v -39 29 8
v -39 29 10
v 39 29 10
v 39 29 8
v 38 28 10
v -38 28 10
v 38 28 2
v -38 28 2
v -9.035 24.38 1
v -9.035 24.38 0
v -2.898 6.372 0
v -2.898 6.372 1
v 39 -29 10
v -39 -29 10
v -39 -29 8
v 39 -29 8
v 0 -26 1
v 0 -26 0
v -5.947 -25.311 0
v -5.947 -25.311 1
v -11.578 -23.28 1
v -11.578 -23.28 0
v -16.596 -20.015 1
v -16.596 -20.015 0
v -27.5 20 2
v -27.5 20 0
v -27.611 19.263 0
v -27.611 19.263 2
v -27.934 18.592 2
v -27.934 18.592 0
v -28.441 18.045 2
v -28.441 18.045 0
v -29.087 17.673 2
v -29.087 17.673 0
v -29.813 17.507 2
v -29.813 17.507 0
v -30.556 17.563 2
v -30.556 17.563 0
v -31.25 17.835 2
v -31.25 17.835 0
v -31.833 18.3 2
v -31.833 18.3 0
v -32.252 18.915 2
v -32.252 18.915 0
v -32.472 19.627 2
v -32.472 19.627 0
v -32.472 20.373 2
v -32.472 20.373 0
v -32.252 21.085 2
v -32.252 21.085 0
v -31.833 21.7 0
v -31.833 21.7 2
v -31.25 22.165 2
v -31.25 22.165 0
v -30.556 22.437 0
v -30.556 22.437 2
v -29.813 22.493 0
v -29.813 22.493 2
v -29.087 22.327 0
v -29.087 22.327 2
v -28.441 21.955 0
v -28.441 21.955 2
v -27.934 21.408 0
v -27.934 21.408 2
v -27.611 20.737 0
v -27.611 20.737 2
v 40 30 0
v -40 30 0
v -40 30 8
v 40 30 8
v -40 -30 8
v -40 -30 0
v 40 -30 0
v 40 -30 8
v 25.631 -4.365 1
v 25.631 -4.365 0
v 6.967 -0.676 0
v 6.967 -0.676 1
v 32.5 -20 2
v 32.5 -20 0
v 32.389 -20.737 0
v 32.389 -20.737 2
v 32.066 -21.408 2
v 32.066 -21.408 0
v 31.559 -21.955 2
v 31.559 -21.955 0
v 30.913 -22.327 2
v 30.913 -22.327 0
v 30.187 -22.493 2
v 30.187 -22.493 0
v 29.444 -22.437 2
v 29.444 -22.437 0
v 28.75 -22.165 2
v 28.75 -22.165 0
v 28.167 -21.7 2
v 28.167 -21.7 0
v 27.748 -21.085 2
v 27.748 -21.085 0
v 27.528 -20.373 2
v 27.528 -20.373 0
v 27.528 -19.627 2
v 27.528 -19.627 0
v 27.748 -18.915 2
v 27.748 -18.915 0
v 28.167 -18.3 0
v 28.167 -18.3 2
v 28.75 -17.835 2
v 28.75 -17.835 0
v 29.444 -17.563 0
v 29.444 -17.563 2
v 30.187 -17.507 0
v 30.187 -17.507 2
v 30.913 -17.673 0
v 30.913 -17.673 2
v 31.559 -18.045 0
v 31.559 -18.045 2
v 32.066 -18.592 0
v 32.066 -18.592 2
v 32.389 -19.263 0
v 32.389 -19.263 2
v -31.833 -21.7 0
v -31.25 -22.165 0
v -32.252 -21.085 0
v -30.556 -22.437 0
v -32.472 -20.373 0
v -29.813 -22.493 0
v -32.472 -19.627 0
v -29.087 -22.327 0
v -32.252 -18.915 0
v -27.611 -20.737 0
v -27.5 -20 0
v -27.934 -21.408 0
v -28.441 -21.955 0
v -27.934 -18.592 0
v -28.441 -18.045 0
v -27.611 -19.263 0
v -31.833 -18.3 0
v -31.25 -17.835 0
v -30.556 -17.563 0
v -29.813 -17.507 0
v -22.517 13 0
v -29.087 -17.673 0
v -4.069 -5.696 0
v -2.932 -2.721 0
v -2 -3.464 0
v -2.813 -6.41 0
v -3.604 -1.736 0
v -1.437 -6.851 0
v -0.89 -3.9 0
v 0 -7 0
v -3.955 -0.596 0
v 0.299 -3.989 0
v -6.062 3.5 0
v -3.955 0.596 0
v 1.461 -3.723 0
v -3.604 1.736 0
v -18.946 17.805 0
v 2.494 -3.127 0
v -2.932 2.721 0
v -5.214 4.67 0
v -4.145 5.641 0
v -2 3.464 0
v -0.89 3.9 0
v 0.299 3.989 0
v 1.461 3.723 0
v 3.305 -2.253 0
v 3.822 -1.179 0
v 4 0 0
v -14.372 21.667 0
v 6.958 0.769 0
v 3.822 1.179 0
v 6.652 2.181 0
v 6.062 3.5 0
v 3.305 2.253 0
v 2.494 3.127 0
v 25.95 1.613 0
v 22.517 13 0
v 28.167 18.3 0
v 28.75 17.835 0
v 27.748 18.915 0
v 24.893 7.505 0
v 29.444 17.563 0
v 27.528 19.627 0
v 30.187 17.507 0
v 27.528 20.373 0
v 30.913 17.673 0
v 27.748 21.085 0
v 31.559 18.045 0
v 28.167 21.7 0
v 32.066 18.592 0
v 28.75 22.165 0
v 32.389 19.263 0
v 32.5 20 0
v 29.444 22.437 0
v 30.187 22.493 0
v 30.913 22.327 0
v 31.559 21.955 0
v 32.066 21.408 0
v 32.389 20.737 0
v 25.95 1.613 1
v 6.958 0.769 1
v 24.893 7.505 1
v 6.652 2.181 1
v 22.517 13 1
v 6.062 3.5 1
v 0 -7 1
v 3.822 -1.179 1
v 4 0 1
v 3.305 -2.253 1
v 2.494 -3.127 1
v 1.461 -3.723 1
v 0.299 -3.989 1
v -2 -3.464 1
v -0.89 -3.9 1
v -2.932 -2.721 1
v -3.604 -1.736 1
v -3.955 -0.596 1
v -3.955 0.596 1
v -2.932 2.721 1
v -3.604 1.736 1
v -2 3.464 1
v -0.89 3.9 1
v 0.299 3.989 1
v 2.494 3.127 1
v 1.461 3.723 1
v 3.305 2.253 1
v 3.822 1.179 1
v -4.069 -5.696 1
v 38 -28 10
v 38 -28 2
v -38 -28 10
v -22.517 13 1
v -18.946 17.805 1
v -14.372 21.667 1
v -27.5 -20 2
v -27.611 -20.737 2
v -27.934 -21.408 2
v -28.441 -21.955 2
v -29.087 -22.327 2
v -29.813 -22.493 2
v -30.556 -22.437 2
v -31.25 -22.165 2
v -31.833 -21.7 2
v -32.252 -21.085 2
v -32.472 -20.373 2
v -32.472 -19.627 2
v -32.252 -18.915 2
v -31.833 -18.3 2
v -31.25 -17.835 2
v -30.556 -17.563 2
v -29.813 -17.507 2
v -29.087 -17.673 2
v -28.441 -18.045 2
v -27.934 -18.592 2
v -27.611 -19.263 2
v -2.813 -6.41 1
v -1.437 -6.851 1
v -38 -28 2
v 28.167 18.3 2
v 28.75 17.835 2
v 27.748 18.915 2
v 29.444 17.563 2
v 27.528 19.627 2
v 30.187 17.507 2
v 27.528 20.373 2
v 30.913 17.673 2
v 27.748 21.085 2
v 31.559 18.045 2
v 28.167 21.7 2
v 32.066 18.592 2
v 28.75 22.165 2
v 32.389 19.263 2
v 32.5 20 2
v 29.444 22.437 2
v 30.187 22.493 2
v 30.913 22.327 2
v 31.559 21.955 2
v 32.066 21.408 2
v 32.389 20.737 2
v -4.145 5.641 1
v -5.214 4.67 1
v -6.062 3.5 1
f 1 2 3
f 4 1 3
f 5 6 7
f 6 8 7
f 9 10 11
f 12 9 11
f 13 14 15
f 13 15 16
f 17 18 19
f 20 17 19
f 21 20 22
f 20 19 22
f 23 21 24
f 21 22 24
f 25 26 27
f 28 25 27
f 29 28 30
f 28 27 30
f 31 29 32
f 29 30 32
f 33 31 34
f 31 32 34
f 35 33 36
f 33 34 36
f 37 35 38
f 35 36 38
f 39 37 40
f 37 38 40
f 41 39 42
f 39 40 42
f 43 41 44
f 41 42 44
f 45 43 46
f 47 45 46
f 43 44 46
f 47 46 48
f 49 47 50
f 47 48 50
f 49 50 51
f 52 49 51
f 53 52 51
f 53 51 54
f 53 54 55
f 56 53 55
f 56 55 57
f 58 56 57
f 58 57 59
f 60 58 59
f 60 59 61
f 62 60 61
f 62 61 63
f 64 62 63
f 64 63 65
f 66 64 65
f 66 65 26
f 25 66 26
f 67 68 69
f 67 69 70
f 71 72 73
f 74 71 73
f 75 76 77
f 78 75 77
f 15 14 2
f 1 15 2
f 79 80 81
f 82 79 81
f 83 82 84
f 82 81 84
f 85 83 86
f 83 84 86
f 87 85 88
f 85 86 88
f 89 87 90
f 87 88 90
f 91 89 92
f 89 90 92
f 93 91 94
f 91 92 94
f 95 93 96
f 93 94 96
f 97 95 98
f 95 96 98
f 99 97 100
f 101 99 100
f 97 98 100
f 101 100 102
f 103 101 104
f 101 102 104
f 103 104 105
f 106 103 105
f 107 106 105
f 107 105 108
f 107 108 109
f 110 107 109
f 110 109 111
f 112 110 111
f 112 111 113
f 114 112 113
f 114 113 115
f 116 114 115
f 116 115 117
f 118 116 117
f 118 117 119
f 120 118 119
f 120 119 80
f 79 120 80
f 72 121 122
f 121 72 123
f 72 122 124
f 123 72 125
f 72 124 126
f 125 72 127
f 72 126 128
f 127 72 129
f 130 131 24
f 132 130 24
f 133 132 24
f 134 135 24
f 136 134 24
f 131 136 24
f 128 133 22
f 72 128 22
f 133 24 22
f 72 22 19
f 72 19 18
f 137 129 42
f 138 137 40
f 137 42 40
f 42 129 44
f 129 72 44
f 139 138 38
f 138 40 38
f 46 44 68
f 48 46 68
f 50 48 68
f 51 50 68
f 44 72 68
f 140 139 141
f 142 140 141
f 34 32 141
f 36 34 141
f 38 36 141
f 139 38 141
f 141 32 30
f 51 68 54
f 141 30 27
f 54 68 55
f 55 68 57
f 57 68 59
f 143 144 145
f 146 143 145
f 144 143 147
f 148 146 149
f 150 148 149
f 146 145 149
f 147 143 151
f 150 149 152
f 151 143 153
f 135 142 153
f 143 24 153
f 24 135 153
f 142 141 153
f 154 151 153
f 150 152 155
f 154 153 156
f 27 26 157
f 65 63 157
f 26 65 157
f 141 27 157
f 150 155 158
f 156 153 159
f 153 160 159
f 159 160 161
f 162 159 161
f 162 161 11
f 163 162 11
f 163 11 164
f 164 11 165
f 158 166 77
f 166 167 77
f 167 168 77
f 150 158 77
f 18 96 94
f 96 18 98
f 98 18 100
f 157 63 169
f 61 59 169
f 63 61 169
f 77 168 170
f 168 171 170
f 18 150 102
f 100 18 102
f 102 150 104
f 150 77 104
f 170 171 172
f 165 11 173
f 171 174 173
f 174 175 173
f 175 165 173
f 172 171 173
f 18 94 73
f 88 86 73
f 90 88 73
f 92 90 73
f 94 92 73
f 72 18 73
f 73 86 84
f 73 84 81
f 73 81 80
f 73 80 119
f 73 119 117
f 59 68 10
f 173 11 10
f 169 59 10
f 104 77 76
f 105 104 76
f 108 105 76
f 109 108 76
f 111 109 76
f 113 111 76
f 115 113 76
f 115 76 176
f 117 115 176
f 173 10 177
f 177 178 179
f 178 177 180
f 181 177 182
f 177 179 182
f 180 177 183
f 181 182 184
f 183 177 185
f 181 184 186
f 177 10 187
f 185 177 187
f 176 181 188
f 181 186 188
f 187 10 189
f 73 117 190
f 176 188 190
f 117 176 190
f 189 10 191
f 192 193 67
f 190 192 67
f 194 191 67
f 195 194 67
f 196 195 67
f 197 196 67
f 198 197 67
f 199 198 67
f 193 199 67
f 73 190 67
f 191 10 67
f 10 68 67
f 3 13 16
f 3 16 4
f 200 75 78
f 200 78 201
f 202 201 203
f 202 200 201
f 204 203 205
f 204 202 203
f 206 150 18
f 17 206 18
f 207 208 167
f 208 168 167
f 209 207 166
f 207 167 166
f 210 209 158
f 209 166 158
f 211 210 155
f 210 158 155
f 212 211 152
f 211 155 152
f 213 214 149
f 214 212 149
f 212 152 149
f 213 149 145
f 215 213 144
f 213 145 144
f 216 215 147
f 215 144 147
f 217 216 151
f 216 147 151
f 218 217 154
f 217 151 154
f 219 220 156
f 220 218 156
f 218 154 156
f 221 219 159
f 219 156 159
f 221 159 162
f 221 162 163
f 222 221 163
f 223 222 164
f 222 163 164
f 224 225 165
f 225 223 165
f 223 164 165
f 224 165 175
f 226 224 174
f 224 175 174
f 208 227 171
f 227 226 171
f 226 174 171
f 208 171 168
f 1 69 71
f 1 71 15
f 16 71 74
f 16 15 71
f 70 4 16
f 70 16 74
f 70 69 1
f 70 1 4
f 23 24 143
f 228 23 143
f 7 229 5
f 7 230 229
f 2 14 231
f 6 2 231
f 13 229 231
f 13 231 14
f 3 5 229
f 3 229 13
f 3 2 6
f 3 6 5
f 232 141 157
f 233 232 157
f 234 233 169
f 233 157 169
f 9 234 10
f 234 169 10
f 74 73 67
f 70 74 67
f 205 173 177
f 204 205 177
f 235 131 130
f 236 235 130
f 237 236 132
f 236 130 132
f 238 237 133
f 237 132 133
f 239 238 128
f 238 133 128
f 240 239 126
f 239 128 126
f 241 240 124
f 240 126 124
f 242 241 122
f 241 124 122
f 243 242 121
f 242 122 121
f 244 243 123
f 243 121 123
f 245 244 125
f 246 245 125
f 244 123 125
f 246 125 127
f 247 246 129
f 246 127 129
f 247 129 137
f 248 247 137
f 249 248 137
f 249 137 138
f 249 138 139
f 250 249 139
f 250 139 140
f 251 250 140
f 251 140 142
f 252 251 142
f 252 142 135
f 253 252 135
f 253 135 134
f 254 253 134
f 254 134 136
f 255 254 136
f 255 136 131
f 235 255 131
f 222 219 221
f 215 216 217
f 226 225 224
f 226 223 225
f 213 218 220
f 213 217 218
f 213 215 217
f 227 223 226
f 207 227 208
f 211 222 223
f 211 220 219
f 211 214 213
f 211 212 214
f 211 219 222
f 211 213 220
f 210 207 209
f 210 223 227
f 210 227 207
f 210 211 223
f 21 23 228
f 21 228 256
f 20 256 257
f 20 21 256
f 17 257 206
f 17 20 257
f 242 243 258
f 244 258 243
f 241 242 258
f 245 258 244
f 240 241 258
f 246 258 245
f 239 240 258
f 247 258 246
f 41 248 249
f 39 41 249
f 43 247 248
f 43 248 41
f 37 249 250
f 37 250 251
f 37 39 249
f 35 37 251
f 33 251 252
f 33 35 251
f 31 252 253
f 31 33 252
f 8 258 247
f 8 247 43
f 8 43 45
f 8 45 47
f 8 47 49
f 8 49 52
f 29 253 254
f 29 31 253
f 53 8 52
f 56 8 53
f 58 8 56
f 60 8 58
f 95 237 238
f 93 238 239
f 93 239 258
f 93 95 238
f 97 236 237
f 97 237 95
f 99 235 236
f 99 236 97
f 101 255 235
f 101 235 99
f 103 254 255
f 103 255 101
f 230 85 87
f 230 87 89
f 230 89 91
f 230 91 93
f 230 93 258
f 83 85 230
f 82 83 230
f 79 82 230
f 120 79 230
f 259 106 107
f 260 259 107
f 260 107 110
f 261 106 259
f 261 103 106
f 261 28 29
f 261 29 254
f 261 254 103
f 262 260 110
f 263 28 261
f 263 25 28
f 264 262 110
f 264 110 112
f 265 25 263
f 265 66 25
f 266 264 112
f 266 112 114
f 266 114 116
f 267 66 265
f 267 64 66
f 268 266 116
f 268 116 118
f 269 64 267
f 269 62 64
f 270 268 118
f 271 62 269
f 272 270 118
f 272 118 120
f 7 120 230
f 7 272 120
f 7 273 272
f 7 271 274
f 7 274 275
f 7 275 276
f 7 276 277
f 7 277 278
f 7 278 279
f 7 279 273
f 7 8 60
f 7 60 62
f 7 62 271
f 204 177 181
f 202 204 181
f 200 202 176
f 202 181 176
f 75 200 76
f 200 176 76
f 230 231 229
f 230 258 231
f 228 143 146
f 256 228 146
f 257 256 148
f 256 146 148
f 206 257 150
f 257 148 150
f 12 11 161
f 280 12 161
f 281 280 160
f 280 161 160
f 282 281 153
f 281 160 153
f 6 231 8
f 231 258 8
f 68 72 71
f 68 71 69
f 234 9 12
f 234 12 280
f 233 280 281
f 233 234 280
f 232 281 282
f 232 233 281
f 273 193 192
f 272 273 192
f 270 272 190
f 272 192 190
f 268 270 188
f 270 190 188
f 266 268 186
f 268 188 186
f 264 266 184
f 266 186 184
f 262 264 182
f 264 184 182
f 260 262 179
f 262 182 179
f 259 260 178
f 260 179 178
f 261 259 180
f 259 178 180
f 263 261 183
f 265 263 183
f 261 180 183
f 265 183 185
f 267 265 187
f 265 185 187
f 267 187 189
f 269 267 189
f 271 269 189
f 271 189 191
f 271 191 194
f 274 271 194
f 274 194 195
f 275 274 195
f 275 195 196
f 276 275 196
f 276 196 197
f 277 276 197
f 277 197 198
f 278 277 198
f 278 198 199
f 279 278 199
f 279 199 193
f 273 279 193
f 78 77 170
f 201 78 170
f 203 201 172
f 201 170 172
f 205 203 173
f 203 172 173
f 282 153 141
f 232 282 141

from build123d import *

# Parameters (mm, degrees)
F0_W      = 80
F0_H      = 60
F1_DEPTH  = 10
F2_T      = -2
F3_W      = 80
F3_H      = 60
F3_W_2    = 77.999998
F3_H_2    = 57.999998
F4_DEPTH  = 2
F5_R      = 2.5
F6_DEPTH  = 25
F7_R      = 4
F8_DEPTH  = 1
F10_COUNT = 3


with BuildPart() as f1:
    # F0 (on Top) → F1 (new body)
    with BuildSketch(Plane.XY):
        Rectangle(F0_W, F0_H)
    extrude(amount=F1_DEPTH)

    # F2
    f2_openings = [f1.faces().sort_by_distance(p)[0] for p in [
        (0, 0, 10),
    ]]
    offset(amount=F2_T, openings=f2_openings)

    # F3 (on face) → F4 (cut)
    with BuildSketch(Plane.XY.offset(10)):
        Rectangle(F3_W, F3_H)
        Rectangle(F3_W_2, F3_H_2, mode=Mode.SUBTRACT)
    extrude(amount=-F4_DEPTH, mode=Mode.SUBTRACT)

    # F5 (on face) → F6 (cut)
    with BuildSketch(Plane(origin=(0, 0, 0), x_dir=(1, 0, 0), z_dir=(0, 0, -1))):
        with Locations((-30, 20)):
            Circle(F5_R)
        with Locations((30, -20)):
            Circle(F5_R)
        with Locations((30, 20)):
            Circle(F5_R)
        with Locations((-30, -20)):
            Circle(F5_R)
    extrude(amount=-F6_DEPTH, mode=Mode.SUBTRACT)


with BuildPart() as f8:
    # F7 (on face) → F8 (new body)
    with BuildSketch(Plane(origin=(0, 0, 0), x_dir=(1, 0, 0), z_dir=(0, 0, -1))):
        Circle(F7_R)
        with BuildLine():
            Line((-16.595718, 20.014549), (-4.069261, 5.69571))
            ThreePointArc((-4.069261, 5.69571), (-2.136589, 6.665957), (0, 7))
            Line((0, 7), (0, 26))
            ThreePointArc((0, 26), (-8.821047, 24.457905), (-16.595718, 20.014549))
        make_face()
    extrude(amount=-F8_DEPTH)


with BuildPart() as f10_1:
    # F10: instance of F8
    add(f8.part.rotate(Axis((0, 0, 0.430848), (0, 0, -1)), 1 * 360 / F10_COUNT))


with BuildPart() as f10_2:
    # F10: instance of F8
    add(f8.part.rotate(Axis((0, 0, 0.430848), (0, 0, -1)), 2 * 360 / F10_COUNT))


with BuildPart() as f1_1:
    add(f1.part)

    # F11: cut F8, F10_1, F10_2
    add(f8.part, mode=Mode.SUBTRACT)
    add(f10_1.part, mode=Mode.SUBTRACT)
    add(f10_2.part, mode=Mode.SUBTRACT)


solid = f1_1.part
